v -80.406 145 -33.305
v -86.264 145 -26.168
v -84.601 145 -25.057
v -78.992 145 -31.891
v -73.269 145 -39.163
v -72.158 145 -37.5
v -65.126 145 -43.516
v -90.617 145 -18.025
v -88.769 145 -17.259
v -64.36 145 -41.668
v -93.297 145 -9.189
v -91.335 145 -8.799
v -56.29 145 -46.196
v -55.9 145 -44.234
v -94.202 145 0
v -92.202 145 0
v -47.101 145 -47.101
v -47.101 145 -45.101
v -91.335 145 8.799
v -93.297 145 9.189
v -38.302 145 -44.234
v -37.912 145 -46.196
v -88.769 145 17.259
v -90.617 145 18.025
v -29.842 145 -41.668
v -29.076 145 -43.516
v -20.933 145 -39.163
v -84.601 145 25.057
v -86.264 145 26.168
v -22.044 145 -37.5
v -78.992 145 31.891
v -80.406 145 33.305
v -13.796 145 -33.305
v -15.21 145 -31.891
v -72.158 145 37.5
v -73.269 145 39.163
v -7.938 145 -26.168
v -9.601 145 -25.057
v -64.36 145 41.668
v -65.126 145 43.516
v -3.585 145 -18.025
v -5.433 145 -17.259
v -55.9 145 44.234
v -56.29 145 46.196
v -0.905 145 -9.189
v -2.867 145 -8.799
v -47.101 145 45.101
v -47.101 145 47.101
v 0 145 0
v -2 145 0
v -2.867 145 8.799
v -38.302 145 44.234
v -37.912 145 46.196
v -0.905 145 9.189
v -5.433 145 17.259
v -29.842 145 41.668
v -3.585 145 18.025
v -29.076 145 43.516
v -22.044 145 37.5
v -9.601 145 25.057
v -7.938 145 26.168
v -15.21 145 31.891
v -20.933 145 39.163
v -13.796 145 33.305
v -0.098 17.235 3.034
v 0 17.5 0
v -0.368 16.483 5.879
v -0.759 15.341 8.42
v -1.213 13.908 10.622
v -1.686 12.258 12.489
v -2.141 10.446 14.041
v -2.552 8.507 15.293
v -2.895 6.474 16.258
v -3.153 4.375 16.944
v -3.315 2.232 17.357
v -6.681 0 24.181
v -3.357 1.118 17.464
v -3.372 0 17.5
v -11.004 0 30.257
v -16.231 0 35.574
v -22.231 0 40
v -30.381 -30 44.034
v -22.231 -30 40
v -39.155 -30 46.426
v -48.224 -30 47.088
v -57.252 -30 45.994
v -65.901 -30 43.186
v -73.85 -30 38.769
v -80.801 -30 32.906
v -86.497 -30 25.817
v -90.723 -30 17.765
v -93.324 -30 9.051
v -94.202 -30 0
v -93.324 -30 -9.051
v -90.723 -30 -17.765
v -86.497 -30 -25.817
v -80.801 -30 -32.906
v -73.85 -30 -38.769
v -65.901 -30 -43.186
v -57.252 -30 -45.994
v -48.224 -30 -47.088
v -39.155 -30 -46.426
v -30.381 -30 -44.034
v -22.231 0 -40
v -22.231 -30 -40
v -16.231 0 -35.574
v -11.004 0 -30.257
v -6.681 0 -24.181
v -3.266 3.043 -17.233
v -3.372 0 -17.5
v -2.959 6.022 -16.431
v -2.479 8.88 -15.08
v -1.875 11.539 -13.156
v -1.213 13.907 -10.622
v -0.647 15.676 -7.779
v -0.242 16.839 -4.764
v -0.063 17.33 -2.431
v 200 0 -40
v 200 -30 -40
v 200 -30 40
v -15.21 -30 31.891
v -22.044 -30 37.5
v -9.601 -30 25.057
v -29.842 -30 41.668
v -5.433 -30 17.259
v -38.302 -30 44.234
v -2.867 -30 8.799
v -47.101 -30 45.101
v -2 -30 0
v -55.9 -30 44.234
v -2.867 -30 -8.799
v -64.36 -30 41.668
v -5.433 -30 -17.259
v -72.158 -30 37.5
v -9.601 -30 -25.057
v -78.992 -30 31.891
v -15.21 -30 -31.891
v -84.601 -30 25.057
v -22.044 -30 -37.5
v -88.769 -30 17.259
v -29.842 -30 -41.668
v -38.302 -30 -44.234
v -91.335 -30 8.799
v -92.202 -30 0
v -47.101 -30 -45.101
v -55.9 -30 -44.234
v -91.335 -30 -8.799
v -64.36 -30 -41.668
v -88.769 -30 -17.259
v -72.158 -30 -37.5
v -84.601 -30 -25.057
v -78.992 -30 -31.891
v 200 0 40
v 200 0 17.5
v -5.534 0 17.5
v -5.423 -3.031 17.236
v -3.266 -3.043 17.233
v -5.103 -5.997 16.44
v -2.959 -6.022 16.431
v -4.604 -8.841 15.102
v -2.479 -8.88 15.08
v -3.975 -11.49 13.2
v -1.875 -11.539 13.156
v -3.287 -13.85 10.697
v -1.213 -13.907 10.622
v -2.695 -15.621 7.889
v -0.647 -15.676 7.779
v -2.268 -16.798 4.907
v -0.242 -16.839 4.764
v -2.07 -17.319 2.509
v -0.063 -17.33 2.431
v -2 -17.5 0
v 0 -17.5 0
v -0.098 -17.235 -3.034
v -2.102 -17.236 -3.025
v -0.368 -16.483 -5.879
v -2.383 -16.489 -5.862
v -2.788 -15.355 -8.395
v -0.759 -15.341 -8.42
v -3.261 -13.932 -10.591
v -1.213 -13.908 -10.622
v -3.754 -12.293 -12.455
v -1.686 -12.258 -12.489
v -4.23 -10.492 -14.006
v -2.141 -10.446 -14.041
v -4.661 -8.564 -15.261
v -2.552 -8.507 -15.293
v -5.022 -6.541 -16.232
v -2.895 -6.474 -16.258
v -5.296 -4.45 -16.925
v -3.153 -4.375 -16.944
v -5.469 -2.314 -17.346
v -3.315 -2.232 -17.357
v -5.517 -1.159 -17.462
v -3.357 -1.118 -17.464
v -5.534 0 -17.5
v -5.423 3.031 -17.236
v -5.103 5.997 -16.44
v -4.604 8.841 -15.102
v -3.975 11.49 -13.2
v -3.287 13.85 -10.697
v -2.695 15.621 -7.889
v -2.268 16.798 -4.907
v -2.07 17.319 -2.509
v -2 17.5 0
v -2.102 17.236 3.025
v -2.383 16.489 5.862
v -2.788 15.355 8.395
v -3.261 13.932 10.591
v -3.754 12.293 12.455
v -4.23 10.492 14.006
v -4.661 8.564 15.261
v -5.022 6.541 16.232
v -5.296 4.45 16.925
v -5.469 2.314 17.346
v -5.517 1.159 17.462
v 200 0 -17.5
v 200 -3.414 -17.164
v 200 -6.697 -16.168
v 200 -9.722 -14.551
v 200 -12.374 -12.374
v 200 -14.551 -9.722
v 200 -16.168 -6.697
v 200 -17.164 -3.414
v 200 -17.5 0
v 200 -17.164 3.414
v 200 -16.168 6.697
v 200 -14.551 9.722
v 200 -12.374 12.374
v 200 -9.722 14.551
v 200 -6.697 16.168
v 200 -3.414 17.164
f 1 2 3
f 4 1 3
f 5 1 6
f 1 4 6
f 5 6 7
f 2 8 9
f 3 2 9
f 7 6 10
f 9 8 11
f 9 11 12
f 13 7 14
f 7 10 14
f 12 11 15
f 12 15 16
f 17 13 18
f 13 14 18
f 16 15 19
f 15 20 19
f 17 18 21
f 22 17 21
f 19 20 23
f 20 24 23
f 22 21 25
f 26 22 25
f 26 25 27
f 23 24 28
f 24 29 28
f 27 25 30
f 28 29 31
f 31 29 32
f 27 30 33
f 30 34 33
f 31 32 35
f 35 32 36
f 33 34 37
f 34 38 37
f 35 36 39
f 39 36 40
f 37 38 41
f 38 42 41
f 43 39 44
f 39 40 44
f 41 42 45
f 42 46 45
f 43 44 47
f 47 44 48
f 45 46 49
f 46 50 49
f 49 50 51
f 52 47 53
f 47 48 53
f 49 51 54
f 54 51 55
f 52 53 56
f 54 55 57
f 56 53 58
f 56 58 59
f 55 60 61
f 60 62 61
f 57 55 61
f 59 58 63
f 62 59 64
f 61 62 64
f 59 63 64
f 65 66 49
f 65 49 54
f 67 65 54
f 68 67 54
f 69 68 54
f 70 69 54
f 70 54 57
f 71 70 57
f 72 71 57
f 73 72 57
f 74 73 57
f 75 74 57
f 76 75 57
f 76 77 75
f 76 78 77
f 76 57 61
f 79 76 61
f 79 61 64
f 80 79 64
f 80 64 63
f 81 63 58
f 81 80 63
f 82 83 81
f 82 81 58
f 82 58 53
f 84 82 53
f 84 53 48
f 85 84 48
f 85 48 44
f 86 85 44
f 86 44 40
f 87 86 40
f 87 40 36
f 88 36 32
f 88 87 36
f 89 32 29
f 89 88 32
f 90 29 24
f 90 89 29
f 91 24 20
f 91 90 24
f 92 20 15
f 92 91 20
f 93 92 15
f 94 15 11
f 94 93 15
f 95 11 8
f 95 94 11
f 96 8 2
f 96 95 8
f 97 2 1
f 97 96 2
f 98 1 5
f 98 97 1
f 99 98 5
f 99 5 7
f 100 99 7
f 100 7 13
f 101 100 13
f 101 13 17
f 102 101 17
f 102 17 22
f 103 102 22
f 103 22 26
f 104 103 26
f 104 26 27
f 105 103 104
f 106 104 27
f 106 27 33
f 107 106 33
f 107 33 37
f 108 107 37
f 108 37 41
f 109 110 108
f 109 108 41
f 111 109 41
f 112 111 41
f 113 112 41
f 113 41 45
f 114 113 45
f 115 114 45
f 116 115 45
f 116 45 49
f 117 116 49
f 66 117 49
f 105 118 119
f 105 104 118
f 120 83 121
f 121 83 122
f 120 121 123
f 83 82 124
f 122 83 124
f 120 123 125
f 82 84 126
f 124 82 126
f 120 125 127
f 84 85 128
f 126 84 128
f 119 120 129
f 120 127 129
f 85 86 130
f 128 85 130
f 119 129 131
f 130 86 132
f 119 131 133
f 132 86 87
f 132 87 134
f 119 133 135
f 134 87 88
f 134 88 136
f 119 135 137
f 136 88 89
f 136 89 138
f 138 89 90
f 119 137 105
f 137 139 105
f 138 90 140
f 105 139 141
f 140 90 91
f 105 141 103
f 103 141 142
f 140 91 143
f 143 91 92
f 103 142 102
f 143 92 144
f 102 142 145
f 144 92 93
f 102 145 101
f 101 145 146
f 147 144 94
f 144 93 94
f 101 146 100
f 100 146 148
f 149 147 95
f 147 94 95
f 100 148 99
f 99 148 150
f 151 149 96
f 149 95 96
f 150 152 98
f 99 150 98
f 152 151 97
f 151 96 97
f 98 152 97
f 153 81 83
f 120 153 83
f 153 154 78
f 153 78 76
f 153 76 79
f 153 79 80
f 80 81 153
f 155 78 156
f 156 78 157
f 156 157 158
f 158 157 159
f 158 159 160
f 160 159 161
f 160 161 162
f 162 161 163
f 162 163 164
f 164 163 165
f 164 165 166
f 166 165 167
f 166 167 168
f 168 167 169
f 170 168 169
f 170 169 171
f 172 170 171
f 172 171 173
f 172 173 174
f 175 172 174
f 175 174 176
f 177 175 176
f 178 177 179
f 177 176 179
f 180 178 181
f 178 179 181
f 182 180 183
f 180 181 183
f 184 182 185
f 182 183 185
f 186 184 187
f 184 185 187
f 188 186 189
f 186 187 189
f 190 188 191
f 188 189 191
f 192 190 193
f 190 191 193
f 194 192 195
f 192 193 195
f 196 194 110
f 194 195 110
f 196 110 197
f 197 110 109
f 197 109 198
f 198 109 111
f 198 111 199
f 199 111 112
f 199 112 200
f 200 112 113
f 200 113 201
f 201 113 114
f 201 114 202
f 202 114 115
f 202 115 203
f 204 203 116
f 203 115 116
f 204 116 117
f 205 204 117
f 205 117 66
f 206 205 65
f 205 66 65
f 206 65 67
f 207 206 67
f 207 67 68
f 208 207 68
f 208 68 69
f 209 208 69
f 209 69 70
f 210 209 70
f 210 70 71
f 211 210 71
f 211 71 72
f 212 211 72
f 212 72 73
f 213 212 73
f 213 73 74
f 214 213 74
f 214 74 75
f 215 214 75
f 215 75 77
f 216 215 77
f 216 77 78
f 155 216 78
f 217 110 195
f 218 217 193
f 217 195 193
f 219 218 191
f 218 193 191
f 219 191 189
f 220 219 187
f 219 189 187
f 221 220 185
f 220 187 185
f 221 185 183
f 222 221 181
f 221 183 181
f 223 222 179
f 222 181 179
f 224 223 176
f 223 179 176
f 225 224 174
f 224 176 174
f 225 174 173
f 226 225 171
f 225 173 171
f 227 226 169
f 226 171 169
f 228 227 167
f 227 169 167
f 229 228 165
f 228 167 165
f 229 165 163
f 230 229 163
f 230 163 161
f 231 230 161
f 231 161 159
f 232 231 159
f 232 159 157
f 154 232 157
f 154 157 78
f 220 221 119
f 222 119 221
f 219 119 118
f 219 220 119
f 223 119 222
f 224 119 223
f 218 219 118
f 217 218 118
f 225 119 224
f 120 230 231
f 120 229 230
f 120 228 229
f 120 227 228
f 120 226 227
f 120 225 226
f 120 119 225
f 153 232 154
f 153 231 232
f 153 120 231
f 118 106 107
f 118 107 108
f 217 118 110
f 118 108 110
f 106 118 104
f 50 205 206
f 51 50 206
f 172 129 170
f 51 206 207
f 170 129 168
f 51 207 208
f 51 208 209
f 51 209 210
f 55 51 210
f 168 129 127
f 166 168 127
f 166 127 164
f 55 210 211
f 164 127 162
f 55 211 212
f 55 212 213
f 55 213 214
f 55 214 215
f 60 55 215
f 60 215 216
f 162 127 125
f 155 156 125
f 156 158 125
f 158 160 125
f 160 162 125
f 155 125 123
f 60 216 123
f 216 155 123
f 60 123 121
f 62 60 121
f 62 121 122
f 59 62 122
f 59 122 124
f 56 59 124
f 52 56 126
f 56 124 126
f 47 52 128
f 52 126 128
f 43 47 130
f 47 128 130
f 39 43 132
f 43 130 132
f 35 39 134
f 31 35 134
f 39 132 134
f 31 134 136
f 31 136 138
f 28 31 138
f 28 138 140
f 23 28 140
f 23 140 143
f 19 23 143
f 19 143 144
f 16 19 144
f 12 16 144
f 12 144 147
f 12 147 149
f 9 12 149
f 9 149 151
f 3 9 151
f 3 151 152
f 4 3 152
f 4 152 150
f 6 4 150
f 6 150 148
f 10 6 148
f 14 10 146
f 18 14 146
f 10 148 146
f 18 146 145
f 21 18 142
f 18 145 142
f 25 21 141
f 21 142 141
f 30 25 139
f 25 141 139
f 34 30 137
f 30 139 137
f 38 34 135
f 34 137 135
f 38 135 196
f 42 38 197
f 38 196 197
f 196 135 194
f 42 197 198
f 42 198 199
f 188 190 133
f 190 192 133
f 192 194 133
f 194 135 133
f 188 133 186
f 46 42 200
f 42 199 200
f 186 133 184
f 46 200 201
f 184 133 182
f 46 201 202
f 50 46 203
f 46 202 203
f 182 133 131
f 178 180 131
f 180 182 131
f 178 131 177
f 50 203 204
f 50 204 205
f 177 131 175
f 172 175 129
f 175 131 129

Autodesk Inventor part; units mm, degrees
ref_plane "YZ Plane" through (0, 0, 0) normal (1, 0, 0) x (0, 1, 0)
ref_plane "XZ Plane" through (0, 0, 0) normal (0, 1, 0) x (-1, 0, 0)
ref_plane "XY Plane" through (0, 0, 0) normal (0, 0, 1) x (1, 0, 0)
sketch "草圖1" plane through (0, 0, 0) normal (1, 0, 0) x (0, 1, 0)
  arc A0 (0, 17.5) -> (0, -17.5) centre (0, 0) ccw
  arc A1 (0, 20) -> (0, -20) centre (0, 0) ccw
  line L0 (0, 17.5) -> (0, 20)
  line L1 (0, -20) -> (0, -17.5)
  line L2 (0, -56) -> (0, 56) projected
  line L3 (0, -40) -> (-30, -40)
  line L4 (-30, -40) -> (-30, -20)
  line L5 (0, -40) -> (0, -20)
  line L6 (-36, 0) -> (6, 0) projected
  line L7 (0, 40) -> (-30, 40)
  line L8 (-30, 40) -> (-30, -20)
  point P0 (0, -20)
  dimension "d0" = 17.5
  dimension "d1" = 20
  dimension "d4" = 30
  dimension "d5" = 40
extrude "擠出1" add sketch "草圖1" along normal blind 200 contours A0 L6 A1 L0 | A0 L1 A1 L6 | A1 L6 L8 L7 L2 | A1 L2 L3 L4 L8 L6
sketch "草圖3" plane through (0, -30, -40) normal (0, -1, 0) x (1, 0, 0)
  circle A0 centre (-47.101, 40) radius 45.101
  circle A1 centre (-47.101, 40) radius 47.101
  line L0 (-153.0424, 40) -> (258.8404, 40) projected
  line L1 (0, 80) -> (0, 0) projected
  point P0 (0, 40)
  dimension "d6" = 90.202
  dimension "d7" = 2
extrude "擠出2" add sketch "草圖3" against normal blind 175 contours L0 A1 A0 | A0 L0 A1
extrude "擠出3" add sketch "草圖1" against normal up to surface contours A0 L6 A1 L0 | A0 L1 A1 L6 | A1 L6 L8 L7 L2 | A1 L2 L3 L4 L8 L6
sketch "草圖4" plane through (200, 0, 0) normal (1, 0, 0) x (0, 0, -1)
  arc A0 (-17.5, 0) -> (17.5, 0) centre (0, 0) ccw projected
  circle A1 centre (0, 0) radius 17.5
extrude "擠出4" cut sketch "草圖4" against normal up to surface
properties part number "直線軌道"
